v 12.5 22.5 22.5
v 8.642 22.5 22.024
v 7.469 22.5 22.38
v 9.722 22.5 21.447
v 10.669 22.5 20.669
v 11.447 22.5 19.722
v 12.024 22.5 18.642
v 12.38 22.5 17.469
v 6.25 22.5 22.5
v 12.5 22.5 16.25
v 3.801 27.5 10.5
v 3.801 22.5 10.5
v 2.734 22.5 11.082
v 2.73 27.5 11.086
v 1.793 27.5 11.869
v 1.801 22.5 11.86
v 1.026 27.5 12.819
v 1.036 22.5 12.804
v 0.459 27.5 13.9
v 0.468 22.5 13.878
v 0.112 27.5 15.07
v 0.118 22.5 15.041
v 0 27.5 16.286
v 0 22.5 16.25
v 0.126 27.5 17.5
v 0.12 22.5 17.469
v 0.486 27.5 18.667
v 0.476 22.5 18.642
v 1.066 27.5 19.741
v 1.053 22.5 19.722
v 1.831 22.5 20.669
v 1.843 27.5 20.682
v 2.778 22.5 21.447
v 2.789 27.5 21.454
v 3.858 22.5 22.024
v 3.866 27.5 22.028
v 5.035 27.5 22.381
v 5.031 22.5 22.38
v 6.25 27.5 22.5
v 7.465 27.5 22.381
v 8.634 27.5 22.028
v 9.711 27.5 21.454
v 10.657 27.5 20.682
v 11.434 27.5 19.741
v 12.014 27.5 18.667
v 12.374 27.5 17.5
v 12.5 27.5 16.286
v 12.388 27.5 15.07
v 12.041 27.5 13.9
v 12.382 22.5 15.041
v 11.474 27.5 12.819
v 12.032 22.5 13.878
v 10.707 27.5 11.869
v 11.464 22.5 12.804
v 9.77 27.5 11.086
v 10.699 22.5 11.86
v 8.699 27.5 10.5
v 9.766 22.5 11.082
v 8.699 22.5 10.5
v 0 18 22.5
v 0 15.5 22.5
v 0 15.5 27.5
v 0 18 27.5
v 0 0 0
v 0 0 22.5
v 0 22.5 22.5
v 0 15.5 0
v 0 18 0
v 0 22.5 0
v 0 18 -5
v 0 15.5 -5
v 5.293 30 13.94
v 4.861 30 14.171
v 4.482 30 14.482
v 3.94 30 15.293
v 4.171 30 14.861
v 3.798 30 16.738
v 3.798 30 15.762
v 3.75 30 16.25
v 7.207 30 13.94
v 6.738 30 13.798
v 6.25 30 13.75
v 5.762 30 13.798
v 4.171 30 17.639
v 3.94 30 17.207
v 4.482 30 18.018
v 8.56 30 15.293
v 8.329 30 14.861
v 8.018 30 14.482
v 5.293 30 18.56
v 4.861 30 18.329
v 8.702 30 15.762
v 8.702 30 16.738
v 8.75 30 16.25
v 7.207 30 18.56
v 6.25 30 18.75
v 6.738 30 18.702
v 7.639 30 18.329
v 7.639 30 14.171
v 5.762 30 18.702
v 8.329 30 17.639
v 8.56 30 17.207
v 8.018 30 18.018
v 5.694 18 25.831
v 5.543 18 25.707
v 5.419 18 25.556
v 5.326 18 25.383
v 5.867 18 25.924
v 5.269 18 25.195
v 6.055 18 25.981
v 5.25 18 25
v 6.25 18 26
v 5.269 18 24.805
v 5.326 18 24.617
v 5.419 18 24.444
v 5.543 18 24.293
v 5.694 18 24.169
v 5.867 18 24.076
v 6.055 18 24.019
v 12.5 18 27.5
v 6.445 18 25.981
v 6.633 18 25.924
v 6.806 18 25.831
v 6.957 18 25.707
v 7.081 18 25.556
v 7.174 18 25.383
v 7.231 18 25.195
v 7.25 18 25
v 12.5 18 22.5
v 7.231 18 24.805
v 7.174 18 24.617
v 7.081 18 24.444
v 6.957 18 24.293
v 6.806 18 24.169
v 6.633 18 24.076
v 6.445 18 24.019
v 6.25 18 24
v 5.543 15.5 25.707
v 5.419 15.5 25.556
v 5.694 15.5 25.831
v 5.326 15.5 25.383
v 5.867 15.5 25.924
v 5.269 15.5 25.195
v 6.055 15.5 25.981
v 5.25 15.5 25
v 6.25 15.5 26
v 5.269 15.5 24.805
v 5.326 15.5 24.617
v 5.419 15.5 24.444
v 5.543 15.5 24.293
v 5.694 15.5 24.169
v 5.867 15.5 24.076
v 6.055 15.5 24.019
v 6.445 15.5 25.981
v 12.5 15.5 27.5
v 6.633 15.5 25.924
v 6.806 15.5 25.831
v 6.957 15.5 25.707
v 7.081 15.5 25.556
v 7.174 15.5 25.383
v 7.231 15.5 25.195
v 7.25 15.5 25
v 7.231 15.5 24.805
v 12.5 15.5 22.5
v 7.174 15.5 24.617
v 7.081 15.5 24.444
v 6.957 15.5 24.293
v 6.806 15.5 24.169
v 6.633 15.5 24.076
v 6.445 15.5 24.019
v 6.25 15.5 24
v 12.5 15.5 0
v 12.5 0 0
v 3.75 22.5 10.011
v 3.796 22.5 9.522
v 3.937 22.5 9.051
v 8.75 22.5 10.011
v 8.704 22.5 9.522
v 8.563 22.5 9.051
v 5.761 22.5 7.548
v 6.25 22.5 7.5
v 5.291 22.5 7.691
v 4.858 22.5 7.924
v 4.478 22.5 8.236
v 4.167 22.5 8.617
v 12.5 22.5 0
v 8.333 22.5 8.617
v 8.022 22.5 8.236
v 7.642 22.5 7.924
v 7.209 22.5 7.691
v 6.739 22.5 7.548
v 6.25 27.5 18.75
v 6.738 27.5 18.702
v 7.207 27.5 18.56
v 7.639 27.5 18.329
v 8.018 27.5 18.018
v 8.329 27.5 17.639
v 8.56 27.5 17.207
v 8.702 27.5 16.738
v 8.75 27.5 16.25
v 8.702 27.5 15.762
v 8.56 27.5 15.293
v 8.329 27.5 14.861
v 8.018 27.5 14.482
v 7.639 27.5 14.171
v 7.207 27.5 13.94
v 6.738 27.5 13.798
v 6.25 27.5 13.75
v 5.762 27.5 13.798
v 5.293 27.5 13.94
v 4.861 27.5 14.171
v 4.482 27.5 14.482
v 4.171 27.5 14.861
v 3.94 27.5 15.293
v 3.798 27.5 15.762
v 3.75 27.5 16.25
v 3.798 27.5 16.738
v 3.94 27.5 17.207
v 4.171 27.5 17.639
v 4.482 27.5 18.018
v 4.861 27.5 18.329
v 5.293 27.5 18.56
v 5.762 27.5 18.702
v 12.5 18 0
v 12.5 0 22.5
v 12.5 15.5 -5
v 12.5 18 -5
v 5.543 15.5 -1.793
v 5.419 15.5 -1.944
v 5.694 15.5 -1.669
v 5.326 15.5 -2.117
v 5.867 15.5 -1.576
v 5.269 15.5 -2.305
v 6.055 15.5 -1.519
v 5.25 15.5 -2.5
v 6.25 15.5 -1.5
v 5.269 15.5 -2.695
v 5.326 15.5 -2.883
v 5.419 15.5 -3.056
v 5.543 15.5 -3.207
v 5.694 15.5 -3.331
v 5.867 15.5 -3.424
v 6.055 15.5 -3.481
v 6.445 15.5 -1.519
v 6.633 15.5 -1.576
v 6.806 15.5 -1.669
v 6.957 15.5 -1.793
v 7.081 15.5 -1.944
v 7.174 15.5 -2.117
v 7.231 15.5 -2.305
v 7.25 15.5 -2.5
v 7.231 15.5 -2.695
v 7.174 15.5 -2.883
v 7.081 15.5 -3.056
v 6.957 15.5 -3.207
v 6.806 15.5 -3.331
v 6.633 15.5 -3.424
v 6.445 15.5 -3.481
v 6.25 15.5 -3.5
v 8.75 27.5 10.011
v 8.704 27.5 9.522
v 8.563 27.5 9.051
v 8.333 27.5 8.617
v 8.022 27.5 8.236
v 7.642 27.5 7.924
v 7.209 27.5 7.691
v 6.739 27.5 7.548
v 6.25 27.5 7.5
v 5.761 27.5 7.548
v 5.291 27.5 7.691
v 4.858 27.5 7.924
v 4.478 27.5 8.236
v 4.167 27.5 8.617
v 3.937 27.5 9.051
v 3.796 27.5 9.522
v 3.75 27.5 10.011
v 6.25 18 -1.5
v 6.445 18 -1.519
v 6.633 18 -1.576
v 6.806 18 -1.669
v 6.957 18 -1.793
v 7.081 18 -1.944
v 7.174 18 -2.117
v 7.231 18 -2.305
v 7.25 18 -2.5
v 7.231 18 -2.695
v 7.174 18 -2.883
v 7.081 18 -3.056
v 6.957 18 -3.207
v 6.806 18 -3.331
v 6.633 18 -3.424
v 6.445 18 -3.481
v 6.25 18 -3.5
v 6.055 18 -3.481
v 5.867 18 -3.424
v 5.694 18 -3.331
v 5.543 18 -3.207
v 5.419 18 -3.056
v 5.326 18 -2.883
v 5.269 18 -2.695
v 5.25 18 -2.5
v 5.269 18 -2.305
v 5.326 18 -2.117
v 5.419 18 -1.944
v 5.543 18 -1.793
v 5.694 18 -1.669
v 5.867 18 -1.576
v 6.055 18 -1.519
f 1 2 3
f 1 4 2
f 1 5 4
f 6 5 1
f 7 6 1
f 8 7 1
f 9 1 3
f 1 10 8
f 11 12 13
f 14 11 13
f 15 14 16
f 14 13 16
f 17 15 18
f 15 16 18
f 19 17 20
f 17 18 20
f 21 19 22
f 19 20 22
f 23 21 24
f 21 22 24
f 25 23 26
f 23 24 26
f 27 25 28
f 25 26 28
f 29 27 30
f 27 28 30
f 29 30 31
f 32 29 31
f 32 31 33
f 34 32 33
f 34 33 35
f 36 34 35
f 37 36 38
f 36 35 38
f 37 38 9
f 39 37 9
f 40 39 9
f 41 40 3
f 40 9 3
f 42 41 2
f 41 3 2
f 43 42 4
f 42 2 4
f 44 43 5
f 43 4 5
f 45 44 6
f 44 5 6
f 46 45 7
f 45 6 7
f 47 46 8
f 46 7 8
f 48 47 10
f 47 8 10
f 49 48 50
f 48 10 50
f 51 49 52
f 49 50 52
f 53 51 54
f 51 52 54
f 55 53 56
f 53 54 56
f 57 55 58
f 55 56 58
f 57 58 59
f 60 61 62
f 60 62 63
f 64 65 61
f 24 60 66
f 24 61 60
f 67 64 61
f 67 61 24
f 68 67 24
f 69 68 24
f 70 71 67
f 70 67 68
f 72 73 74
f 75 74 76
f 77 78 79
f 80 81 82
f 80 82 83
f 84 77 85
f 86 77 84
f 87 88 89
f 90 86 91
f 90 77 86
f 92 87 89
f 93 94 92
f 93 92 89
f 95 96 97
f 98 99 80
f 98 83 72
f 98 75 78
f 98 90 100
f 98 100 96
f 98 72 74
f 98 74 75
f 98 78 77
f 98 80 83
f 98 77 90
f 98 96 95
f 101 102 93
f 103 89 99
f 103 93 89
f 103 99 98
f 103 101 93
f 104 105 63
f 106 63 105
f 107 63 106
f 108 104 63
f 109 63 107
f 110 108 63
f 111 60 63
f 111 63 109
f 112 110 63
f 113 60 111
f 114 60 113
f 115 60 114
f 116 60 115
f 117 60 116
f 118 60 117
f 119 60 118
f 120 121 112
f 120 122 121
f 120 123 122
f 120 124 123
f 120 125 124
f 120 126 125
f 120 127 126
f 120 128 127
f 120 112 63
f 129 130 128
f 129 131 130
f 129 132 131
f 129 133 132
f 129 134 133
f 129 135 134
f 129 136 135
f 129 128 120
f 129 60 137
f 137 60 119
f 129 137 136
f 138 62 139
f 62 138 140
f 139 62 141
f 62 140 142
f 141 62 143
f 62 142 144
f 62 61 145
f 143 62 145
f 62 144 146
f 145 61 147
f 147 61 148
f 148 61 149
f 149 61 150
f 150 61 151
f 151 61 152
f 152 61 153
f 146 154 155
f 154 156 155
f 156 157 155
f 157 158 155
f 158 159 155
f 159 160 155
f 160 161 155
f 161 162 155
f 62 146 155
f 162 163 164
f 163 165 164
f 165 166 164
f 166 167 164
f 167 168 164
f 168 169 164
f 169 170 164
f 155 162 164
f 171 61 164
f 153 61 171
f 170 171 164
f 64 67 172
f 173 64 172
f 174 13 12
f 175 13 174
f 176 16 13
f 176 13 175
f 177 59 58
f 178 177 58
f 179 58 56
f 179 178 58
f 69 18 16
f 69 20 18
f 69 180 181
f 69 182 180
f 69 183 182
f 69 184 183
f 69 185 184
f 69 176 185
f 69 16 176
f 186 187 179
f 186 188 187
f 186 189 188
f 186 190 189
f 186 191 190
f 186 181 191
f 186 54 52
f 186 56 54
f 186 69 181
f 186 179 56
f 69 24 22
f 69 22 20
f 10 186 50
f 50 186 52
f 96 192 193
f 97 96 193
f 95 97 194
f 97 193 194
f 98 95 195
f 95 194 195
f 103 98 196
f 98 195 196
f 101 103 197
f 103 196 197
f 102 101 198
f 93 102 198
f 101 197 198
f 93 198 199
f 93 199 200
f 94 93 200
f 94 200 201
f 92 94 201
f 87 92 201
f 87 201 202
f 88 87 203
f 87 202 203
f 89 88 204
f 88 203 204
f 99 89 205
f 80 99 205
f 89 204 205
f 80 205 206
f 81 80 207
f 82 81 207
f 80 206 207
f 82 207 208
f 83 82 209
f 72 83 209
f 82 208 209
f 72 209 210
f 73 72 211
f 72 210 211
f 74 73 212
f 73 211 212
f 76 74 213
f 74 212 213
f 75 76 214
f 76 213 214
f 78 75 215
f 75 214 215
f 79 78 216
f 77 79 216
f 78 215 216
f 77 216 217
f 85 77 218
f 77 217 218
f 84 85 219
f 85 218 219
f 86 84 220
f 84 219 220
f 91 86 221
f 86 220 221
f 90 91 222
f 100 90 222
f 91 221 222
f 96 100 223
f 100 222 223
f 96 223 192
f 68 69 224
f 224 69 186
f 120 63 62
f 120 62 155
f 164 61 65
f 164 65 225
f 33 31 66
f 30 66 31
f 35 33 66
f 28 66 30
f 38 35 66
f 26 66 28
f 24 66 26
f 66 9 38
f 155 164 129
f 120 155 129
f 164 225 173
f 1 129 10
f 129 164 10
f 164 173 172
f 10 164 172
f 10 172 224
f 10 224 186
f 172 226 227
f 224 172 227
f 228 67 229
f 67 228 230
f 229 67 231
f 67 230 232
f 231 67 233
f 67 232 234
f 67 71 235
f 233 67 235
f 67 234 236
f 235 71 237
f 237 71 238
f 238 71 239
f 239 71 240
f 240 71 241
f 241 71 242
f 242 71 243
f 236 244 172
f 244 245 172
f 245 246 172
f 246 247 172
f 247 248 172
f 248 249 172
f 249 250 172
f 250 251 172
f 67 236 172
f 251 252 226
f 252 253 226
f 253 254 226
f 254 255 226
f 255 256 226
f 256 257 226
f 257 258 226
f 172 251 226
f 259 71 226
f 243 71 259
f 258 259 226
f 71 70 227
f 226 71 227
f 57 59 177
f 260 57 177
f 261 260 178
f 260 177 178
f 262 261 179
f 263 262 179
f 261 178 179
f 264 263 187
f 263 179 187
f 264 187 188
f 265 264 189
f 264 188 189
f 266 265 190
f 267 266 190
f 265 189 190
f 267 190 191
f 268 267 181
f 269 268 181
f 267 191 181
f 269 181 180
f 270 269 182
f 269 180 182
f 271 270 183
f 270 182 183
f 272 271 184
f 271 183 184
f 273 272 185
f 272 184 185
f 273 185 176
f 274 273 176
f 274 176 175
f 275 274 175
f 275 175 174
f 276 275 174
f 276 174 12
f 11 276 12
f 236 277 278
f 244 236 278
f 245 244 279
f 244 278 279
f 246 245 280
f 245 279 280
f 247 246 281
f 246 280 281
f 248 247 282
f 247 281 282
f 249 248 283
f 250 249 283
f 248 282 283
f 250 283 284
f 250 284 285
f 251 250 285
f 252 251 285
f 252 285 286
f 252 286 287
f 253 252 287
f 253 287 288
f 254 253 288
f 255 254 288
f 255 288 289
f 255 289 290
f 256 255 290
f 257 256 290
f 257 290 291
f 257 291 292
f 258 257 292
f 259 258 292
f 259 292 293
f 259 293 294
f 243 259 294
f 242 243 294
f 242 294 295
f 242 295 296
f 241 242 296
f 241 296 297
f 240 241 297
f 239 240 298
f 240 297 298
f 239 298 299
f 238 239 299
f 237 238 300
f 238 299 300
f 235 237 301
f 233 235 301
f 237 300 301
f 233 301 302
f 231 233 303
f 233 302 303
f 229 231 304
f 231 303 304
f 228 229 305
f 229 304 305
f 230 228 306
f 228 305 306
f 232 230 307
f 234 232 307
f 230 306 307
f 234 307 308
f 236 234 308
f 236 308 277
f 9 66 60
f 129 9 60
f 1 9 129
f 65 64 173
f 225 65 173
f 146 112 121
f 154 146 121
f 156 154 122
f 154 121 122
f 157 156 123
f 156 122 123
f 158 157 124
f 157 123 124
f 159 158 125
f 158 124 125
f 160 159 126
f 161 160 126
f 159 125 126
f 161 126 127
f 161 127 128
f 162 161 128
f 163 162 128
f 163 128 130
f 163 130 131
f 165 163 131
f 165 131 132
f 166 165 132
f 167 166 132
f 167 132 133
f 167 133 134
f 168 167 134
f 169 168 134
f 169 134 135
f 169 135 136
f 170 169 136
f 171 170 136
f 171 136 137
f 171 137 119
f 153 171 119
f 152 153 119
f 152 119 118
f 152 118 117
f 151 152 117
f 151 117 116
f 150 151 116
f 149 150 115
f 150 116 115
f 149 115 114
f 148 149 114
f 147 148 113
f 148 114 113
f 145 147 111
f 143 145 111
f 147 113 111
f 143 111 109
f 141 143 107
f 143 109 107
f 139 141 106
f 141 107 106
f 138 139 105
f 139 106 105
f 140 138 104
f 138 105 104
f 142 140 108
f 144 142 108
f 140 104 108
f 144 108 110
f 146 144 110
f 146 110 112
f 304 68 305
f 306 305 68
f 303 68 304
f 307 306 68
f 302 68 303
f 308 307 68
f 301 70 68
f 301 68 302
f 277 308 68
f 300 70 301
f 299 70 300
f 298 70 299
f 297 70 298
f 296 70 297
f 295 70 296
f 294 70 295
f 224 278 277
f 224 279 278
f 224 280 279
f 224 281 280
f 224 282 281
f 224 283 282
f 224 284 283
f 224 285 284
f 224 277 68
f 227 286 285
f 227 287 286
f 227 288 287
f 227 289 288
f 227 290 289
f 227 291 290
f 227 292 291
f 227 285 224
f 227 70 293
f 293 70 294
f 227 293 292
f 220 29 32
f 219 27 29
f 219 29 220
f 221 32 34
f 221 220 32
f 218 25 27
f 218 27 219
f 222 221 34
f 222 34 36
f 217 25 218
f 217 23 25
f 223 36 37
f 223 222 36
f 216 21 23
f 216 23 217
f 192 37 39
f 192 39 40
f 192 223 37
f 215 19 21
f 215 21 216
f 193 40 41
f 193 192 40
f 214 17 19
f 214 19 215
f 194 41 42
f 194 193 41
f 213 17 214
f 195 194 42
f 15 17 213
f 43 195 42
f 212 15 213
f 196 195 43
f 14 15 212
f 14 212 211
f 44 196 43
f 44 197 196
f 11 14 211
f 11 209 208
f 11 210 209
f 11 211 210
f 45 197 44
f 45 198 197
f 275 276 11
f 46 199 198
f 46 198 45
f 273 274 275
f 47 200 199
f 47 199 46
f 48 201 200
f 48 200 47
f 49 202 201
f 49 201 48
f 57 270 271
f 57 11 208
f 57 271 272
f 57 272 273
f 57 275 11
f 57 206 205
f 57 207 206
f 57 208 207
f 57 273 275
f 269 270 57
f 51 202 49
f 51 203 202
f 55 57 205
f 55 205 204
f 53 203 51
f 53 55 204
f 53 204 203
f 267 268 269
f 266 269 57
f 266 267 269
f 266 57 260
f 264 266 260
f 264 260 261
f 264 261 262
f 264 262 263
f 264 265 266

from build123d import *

# Parameters (mm, degrees)
SKETCH1_W                = 12.5
SKETCH1_H                = 22.5
BOSS_EXTRUDE1_DEPTH      = 22.5
BOSS_EXTRUDE2_DEPTH      = 5
BOSS_EXTRUDE2_DEPTH_BACK = 27.5
SKETCH2_W                = 12.5
SKETCH2_H                = 2.5
BOSS_EXTRUDE3_DEPTH      = 5
SKETCH4_R                = 2.5
BOSS_EXTRUDE4_DEPTH      = 2.5
SKETCH5_R                = 1
CUT_EXTRUDE1_DEPTH       = 36.163901945


with BuildPart() as part:
    # Sketch1 → Boss-Extrude1 (new body)
    with BuildSketch(Plane.XY):
        with Locations((6.25, 11.25)):
            Rectangle(SKETCH1_W, SKETCH1_H)
    extrude(amount=BOSS_EXTRUDE1_DEPTH)

    # Sketch2 → Boss-Extrude2 (add, two sides: drawn at the far end of the back side and taken through both)
    with BuildSketch(Plane.XY.offset(22.5).offset(-BOSS_EXTRUDE2_DEPTH_BACK)):
        with Locations((6.25, 16.75)):
            Rectangle(SKETCH2_W, SKETCH2_H)
    extrude(amount=BOSS_EXTRUDE2_DEPTH + BOSS_EXTRUDE2_DEPTH_BACK)

    # Sketch3 → Boss-Extrude3 (add)
    with BuildSketch(Plane(origin=(0, 22.5, 0), x_dir=(1, 0, 0), z_dir=(0, 1, 0))):
        with BuildLine():
            ThreePointArc((3.800510257, -10.5), (6.25, -22.5), (8.699489743, -10.5))
            ThreePointArc((8.699489743, -10.5), (6.25, -7.5), (3.800510257, -10.5))
        make_face()
    extrude(amount=BOSS_EXTRUDE3_DEPTH)

    # Sketch4 → Boss-Extrude4 (add)
    with BuildSketch(Plane(origin=(0, 27.5, 0), x_dir=(1, 0, 0), z_dir=(0, 1, 0))):
        with Locations(Location((6.25, -16.25, 0), (0, 0, 270))):
            Circle(SKETCH4_R)
    extrude(amount=BOSS_EXTRUDE4_DEPTH)

    # Sketch5 → Cut-Extrude1 (cut, through all)
    with BuildSketch(Plane(origin=(0, 18, 0), x_dir=(1, 0, 0), z_dir=(0, 1, 0))):
        with Locations(Location((6.25, -25, 0), (0, 0, 270))):
            Circle(SKETCH5_R)
        with Locations(Location((6.25, 2.5, 0), (0, 0, 270))):
            Circle(SKETCH5_R)
    extrude(amount=-CUT_EXTRUDE1_DEPTH, mode=Mode.SUBTRACT)


solid = part.part
